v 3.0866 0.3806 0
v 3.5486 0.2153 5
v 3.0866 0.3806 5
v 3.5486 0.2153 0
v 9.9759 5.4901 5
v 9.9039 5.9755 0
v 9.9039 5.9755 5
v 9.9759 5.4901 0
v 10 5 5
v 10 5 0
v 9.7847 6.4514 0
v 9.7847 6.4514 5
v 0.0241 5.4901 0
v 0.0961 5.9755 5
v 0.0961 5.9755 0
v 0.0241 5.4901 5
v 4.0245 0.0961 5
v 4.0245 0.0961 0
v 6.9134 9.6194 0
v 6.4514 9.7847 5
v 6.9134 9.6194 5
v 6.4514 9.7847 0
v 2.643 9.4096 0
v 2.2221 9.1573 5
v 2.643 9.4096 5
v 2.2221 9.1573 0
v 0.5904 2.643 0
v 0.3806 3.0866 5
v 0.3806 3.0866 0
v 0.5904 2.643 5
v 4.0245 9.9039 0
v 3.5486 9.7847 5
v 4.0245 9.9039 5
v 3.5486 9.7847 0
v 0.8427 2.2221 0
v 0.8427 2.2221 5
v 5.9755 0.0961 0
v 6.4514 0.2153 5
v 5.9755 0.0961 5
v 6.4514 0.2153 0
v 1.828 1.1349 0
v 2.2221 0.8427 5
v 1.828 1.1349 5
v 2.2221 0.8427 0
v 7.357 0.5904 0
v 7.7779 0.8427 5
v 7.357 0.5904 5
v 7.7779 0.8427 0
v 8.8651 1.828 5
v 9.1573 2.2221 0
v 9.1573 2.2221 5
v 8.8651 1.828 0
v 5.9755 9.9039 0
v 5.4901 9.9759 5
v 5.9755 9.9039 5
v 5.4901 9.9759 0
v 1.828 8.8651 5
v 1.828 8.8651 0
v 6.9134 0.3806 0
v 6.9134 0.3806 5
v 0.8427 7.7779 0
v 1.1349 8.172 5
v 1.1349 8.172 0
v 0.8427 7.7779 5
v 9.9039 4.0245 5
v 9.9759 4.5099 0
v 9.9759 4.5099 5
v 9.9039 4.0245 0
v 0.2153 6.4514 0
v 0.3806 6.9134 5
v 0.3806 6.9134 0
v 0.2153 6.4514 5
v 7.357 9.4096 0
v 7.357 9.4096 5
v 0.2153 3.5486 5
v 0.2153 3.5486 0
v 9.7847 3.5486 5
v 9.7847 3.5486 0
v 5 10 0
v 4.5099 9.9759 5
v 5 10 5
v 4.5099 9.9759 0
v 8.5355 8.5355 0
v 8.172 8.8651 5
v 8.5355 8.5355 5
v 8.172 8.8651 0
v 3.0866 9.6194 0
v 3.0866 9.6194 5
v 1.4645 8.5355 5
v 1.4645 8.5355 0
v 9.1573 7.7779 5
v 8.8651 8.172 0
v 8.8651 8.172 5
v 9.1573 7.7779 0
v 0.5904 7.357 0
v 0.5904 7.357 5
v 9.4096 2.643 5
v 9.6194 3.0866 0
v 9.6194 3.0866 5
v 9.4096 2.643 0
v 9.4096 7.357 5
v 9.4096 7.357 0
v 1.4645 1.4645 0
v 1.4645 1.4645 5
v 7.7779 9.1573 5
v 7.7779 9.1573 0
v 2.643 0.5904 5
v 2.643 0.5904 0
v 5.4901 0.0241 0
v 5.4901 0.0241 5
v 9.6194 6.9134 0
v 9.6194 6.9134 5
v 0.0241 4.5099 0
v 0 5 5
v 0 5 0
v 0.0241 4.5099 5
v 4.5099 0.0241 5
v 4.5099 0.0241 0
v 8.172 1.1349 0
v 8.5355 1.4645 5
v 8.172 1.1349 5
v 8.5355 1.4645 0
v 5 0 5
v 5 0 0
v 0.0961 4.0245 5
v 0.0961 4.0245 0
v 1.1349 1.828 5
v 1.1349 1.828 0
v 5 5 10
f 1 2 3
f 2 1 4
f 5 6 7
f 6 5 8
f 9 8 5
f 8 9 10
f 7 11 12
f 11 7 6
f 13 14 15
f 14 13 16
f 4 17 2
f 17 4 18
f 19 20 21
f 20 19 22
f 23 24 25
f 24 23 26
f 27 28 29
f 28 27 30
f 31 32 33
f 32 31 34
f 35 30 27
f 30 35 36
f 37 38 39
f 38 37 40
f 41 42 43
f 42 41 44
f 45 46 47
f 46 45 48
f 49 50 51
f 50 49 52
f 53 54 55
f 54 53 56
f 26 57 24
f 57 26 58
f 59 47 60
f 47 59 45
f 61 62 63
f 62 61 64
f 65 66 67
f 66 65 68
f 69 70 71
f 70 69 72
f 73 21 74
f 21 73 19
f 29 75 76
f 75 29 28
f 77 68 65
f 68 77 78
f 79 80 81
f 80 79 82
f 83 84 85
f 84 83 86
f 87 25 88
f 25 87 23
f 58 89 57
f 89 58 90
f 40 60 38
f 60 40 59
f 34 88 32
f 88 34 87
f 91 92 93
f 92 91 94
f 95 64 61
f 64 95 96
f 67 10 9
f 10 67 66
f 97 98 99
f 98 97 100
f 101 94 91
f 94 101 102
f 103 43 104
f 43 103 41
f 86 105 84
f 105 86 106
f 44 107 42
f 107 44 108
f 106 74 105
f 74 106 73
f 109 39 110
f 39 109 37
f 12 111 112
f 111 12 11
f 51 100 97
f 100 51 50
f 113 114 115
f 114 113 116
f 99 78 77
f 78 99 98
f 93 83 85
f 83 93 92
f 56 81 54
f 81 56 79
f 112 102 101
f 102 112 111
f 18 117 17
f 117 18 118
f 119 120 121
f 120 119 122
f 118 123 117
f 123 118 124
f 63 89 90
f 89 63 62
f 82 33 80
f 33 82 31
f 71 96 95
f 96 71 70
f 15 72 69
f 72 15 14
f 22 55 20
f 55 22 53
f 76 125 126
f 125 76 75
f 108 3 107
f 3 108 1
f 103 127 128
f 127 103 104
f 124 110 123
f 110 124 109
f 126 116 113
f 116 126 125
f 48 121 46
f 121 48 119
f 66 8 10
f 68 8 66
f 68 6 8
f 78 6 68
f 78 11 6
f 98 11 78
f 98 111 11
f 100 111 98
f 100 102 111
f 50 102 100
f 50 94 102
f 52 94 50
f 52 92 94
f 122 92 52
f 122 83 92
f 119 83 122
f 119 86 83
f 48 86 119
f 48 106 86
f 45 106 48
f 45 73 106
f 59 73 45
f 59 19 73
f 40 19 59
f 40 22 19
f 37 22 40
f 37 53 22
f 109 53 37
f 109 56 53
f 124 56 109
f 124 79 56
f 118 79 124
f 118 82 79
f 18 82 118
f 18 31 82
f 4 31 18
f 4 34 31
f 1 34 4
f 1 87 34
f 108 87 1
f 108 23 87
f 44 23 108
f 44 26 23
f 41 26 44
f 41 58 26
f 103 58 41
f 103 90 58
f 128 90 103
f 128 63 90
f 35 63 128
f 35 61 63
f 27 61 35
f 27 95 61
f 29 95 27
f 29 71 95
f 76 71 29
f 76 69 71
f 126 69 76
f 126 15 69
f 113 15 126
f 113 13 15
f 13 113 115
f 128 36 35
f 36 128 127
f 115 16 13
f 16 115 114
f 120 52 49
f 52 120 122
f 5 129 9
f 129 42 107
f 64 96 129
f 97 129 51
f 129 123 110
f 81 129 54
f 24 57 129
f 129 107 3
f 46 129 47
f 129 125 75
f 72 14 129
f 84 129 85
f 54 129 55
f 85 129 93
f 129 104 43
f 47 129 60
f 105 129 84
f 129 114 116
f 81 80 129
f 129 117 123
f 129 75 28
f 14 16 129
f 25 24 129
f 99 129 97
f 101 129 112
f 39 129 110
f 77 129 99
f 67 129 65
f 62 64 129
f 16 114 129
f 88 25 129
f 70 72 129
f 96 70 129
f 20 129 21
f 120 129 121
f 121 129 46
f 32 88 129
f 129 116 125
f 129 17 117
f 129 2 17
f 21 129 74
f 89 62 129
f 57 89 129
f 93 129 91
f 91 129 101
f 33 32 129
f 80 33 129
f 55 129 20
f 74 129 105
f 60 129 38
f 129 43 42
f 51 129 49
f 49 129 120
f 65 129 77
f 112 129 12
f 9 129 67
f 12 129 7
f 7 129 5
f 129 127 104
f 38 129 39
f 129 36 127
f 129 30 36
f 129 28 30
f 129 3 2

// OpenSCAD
$fa = 1;
$fs = 0.4;
$fn=64;
module cone_top_turret(){
    color("white")
    translate([5,5,0])
    cylinder(h=5,d=10);
    color("#2BC176")
    translate([5,5,5])
    cylinder(h=5, r1=5, r2=0);
}
cone_top_turret();
